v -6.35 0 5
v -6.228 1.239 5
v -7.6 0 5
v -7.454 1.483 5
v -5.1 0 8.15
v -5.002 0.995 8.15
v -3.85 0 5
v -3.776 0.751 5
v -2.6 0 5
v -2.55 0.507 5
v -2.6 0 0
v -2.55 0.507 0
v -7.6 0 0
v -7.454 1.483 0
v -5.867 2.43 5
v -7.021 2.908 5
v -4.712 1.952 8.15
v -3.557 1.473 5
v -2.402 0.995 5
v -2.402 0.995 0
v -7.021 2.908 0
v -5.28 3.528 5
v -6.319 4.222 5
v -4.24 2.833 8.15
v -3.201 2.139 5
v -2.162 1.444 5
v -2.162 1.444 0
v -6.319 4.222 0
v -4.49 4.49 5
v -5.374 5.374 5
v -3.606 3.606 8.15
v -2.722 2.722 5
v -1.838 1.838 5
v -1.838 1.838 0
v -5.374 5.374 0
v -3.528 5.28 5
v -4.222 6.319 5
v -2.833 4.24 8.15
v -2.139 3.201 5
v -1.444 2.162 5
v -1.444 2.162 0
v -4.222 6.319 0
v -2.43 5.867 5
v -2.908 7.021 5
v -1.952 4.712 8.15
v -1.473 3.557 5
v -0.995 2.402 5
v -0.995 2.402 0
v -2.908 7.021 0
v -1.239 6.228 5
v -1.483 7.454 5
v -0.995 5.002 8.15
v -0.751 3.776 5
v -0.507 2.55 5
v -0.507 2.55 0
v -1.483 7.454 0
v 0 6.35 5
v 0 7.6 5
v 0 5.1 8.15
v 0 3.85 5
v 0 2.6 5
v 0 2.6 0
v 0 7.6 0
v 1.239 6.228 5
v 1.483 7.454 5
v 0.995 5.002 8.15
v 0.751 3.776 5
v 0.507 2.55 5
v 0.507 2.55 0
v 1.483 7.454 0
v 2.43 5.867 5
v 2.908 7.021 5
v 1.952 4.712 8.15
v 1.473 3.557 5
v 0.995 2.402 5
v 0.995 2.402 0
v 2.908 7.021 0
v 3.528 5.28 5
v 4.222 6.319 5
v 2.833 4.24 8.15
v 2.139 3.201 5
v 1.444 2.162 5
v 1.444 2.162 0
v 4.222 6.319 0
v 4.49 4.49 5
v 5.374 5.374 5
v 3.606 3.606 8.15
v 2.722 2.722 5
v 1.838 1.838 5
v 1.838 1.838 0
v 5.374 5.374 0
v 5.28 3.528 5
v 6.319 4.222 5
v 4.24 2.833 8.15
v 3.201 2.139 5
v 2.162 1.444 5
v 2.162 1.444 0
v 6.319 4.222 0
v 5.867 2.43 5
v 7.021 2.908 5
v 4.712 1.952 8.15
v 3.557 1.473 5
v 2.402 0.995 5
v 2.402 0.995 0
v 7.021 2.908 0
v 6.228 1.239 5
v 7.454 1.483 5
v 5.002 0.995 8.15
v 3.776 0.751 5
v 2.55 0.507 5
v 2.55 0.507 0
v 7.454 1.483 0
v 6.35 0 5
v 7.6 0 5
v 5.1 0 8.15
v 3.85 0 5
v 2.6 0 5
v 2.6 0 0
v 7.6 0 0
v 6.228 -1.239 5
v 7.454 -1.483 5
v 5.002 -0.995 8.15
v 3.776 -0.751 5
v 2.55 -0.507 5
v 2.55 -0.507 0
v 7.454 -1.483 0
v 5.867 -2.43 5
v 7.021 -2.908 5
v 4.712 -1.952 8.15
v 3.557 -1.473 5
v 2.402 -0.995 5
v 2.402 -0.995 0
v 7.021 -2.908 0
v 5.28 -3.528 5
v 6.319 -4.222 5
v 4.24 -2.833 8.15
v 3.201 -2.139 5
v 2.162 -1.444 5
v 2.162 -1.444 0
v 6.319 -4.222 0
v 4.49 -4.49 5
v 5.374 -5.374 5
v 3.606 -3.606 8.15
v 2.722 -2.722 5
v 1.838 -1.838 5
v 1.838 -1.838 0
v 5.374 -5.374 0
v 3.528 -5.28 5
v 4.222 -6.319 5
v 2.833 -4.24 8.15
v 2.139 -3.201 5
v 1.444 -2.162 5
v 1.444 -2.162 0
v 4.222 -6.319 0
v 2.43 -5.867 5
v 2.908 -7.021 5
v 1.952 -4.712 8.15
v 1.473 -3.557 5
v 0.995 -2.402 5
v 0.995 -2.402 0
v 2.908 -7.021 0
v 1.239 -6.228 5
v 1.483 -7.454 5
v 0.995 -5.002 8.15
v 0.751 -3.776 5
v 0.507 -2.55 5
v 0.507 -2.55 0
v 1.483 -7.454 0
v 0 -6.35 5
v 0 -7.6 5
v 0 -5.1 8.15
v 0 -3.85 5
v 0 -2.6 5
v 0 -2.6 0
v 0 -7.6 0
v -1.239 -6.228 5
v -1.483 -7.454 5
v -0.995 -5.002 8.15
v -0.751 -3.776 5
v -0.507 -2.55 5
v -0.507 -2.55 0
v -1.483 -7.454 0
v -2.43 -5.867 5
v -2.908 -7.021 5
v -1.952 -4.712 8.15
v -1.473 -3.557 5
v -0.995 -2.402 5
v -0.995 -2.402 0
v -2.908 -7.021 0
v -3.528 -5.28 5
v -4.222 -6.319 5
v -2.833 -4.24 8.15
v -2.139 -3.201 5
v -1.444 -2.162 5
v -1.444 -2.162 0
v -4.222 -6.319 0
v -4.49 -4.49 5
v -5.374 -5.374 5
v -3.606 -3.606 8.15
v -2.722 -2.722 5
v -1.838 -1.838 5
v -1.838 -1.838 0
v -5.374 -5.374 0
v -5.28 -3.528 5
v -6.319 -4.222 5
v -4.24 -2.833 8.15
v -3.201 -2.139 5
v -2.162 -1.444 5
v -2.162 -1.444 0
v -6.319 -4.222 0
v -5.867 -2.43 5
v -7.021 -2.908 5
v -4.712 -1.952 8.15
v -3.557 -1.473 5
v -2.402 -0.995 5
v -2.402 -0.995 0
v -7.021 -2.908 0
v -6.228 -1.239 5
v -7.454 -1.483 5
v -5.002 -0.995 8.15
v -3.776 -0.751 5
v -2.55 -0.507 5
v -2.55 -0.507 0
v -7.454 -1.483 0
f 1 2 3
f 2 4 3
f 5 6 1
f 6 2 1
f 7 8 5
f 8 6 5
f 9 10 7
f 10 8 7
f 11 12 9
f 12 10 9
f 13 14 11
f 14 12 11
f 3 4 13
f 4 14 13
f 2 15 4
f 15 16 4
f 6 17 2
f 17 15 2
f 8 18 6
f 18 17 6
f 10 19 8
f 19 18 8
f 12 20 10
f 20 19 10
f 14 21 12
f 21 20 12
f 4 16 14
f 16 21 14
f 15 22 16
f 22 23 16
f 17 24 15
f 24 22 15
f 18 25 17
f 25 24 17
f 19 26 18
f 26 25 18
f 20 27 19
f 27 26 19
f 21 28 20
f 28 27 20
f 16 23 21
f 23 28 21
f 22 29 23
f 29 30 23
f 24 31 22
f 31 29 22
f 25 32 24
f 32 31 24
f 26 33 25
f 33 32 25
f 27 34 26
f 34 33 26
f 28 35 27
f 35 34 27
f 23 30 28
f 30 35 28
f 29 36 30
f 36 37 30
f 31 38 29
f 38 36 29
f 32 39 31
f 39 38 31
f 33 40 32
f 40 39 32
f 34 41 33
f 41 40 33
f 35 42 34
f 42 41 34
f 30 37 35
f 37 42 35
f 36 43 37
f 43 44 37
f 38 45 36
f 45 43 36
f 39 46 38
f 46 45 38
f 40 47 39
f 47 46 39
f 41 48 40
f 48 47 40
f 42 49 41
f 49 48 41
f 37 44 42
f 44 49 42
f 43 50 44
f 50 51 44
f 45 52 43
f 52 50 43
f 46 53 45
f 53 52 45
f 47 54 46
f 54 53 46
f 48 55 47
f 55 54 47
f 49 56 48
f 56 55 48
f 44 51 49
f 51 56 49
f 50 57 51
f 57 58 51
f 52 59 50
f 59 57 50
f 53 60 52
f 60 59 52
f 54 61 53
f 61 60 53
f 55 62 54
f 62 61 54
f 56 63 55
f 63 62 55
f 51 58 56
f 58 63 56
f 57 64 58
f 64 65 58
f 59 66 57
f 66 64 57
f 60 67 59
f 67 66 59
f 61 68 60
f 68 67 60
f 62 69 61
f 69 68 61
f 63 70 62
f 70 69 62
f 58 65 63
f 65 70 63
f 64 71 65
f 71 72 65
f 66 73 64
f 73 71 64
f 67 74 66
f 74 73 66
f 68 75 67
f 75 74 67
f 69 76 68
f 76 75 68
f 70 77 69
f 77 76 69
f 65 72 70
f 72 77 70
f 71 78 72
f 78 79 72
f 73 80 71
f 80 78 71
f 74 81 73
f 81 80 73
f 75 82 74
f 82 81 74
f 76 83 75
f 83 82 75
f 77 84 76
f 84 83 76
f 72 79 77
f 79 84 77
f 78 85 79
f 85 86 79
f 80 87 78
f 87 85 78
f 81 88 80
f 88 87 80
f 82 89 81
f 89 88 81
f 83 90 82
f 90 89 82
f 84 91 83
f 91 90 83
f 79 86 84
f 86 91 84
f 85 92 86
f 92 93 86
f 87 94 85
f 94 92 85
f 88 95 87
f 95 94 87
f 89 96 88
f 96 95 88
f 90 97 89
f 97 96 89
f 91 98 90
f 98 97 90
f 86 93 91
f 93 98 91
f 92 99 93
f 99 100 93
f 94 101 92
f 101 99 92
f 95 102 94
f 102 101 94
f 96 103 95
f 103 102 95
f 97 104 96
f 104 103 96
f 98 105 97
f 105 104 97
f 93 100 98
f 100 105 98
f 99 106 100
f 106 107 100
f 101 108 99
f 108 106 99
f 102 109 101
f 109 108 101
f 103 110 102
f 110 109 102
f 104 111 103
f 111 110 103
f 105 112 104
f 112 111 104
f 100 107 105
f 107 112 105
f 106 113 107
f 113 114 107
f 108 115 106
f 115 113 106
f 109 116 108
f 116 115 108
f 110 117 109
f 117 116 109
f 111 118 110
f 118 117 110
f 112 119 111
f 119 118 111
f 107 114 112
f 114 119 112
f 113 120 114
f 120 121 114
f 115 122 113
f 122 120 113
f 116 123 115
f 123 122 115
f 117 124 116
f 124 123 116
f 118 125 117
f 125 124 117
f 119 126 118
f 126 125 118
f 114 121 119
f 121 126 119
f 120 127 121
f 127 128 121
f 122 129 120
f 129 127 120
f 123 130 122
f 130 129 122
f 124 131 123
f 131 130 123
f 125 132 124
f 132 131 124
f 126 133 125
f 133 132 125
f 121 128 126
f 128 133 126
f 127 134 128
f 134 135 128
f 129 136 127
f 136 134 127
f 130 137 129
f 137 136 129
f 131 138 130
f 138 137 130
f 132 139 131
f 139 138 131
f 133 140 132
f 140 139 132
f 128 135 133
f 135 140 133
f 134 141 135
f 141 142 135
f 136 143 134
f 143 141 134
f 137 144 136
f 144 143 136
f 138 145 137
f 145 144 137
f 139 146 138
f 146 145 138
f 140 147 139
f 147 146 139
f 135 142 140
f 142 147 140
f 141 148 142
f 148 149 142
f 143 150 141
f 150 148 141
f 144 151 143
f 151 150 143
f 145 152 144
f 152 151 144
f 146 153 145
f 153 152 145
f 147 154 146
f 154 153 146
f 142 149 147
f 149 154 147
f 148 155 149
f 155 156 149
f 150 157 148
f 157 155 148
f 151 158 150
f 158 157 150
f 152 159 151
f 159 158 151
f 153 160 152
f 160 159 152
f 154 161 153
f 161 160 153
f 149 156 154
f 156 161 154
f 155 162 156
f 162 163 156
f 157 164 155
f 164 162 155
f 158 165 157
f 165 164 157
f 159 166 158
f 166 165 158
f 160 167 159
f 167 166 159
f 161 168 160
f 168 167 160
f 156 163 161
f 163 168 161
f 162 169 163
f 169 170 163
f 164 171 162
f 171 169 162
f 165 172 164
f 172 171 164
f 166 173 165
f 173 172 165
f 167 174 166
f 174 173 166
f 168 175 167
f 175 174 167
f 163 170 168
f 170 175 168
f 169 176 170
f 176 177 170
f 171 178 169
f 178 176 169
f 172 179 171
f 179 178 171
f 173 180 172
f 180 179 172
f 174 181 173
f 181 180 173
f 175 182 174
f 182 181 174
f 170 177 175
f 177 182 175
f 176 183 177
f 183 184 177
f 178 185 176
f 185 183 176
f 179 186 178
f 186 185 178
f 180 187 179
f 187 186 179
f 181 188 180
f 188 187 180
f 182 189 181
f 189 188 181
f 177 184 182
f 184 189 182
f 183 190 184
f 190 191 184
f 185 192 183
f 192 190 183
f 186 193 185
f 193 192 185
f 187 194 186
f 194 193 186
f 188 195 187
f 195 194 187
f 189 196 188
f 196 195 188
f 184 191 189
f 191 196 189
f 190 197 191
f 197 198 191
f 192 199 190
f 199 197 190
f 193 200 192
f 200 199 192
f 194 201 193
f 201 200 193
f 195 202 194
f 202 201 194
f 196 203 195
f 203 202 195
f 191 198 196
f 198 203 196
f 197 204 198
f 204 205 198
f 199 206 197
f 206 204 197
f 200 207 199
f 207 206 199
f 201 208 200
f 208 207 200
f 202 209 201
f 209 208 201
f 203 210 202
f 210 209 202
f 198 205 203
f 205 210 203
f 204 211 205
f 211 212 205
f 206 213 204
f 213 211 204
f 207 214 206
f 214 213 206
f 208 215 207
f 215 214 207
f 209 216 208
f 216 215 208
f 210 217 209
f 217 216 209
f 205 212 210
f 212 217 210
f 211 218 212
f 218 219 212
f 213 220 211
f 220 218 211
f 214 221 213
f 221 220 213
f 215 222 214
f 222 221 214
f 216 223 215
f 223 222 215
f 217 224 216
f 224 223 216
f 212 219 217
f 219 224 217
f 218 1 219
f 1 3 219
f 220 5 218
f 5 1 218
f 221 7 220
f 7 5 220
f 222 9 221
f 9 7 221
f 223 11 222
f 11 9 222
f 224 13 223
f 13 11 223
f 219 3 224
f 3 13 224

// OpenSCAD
$fn = 32;

// ----------------------------------------------------------------------
// Form washer: domed washer, 15.2 mm outside, 5.2 mm bore
// ----------------------------------------------------------------------

// --- parameters (mm) ---
revolve_angle = 360;      // full turn around the Z axis
profile_points = 7;       // points of the closed outline

profile = [[2.6, 0], [7.6, 0], [7.6, 5], [6.35, 5], [5.1, 8.15], [3.85, 5], [2.6, 5]];  // single closed polygon, 7 points, counter clockwise

// --- the one profile operation ---
rotate_extrude(angle = revolve_angle) polygon(points = profile);
